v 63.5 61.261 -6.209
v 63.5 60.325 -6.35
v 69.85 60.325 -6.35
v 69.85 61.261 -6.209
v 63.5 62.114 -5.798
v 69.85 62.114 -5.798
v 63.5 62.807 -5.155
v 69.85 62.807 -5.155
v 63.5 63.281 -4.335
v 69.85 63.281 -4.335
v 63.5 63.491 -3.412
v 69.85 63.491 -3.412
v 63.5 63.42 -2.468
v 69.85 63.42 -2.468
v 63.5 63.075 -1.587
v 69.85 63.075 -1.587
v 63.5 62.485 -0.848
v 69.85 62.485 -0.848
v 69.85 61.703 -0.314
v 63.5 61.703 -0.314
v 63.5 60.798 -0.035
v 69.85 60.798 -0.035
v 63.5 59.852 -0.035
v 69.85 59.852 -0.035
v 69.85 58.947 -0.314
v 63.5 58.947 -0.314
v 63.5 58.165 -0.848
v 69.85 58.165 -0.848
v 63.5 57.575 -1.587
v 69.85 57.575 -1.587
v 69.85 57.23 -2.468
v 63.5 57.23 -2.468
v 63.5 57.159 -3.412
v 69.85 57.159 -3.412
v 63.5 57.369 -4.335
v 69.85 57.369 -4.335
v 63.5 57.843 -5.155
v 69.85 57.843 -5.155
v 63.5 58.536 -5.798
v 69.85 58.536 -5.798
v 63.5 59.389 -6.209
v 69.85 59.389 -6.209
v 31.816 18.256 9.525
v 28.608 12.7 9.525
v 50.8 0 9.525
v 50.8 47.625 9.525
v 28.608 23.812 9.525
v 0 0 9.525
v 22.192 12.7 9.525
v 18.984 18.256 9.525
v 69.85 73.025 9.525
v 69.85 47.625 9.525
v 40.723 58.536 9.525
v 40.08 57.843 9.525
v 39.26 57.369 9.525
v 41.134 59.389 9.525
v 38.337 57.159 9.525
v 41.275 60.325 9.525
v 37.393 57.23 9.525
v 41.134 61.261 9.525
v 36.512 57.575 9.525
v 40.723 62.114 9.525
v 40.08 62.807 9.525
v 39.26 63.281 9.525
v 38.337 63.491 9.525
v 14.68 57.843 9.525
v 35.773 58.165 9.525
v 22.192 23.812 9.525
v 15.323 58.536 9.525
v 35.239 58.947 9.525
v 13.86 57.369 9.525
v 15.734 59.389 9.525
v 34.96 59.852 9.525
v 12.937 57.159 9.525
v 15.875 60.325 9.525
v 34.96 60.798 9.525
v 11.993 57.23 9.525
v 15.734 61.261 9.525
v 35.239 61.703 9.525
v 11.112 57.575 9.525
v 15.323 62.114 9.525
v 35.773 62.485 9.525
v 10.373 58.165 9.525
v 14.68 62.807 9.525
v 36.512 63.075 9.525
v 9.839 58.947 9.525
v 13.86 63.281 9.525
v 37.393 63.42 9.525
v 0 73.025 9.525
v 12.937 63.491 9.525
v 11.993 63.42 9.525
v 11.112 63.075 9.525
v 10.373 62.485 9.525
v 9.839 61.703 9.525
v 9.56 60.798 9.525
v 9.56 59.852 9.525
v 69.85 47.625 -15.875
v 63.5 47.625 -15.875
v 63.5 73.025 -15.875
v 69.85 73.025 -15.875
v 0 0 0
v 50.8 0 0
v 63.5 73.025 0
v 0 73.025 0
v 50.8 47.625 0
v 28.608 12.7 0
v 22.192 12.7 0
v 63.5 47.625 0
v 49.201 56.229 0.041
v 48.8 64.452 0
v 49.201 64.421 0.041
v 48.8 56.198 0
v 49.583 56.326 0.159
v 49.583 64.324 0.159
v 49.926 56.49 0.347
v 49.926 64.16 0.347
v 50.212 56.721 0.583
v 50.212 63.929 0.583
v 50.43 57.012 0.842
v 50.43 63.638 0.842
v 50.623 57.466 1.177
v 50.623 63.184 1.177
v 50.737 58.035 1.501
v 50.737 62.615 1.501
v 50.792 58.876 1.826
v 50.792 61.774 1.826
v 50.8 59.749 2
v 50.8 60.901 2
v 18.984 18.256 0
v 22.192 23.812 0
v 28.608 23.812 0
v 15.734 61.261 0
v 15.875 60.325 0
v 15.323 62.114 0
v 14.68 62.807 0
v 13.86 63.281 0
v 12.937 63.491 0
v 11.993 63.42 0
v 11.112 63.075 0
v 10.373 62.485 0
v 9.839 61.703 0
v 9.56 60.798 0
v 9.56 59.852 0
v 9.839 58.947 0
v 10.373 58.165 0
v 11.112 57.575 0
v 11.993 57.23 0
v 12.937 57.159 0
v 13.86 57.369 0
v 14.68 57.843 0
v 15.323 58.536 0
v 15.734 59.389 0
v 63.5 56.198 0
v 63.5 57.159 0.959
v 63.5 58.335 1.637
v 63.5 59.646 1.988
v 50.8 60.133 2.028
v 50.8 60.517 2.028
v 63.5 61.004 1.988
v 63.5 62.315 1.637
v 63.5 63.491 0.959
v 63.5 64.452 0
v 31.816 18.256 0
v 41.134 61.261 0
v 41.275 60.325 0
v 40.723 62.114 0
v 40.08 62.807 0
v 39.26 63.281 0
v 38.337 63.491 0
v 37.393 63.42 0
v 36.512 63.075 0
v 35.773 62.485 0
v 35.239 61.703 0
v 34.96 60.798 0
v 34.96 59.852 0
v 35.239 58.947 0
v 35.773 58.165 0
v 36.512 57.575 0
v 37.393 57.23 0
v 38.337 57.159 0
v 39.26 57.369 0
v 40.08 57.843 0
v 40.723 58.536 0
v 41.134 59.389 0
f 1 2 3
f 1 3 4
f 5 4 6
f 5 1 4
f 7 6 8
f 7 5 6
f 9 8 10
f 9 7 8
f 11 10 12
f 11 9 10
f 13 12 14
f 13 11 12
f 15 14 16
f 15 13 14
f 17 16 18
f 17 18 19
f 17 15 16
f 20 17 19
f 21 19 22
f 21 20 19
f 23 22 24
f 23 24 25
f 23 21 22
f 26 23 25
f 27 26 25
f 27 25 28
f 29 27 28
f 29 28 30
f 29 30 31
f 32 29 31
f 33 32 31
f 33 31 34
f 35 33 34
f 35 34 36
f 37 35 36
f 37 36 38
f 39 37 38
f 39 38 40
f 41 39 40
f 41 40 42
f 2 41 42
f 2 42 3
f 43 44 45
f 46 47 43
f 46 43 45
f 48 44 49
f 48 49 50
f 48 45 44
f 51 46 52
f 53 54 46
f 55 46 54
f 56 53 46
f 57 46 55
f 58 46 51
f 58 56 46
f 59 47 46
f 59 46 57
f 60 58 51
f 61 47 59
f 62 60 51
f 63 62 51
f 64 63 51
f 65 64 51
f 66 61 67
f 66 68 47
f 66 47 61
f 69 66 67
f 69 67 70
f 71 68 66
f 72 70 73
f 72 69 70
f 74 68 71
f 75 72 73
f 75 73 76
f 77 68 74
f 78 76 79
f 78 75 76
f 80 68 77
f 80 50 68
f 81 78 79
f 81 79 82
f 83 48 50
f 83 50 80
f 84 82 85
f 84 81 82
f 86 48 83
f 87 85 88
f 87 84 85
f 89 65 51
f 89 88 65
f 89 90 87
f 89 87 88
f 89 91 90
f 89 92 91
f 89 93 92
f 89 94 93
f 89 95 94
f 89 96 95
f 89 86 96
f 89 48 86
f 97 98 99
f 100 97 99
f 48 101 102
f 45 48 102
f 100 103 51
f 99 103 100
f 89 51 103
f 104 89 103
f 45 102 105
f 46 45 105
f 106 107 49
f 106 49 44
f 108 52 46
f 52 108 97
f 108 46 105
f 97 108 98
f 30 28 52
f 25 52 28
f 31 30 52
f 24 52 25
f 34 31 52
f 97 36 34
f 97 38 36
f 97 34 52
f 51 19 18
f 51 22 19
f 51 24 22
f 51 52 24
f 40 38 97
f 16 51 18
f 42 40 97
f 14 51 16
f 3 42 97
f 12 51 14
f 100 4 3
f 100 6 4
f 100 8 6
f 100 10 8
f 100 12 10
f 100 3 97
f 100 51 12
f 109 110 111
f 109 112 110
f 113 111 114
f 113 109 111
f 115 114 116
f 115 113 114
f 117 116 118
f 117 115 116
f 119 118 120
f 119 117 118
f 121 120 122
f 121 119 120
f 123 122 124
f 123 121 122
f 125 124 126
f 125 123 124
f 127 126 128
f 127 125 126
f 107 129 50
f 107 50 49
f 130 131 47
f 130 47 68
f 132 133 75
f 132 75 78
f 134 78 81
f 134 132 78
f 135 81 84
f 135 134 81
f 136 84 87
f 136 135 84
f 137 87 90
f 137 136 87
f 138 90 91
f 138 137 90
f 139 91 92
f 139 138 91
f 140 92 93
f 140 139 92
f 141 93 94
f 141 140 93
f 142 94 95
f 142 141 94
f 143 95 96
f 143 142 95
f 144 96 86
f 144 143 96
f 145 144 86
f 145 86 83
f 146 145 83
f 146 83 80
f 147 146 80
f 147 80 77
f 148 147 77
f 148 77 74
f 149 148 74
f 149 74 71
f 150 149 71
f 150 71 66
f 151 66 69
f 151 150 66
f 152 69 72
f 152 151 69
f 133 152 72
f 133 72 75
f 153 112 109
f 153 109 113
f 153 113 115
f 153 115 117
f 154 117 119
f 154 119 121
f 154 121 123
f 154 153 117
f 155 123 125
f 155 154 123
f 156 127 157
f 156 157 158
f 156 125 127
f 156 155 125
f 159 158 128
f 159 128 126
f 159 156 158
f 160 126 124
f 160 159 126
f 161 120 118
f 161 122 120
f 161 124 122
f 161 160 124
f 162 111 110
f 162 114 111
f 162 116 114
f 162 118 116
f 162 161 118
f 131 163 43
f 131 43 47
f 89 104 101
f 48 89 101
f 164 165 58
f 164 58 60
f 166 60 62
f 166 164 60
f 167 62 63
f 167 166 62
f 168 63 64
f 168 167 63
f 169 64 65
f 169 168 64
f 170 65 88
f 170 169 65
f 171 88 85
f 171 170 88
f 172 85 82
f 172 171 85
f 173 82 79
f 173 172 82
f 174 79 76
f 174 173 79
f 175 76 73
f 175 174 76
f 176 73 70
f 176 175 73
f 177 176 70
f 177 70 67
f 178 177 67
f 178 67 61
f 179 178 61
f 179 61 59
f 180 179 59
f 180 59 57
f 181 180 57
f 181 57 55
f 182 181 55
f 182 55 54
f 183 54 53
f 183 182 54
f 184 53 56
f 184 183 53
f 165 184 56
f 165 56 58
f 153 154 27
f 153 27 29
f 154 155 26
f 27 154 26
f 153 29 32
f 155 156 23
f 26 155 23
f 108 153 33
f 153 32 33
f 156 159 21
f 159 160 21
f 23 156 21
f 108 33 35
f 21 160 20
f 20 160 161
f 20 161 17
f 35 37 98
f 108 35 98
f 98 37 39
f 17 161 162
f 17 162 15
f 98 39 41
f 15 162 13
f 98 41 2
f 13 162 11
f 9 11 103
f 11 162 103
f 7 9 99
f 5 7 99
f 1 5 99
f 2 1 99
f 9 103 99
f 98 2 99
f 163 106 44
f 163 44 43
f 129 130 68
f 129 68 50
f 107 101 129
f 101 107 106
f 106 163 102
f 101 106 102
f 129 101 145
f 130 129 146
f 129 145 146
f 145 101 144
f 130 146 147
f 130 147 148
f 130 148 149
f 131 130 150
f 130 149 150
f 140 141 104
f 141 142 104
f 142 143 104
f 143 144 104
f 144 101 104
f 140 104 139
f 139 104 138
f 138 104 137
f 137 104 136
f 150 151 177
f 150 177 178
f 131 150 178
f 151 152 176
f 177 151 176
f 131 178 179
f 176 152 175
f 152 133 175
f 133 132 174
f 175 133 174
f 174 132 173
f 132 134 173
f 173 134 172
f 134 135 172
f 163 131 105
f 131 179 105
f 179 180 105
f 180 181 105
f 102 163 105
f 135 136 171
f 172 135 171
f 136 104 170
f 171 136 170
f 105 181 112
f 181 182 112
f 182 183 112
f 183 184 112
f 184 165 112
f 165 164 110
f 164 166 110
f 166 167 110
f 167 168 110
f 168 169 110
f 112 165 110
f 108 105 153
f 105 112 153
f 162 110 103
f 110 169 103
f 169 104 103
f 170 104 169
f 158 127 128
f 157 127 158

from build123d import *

# Parameters (mm, degrees)
SKETCH2_R      = 3.175
EXTRUDE1_DEPTH = 9.525
SKETCH3_W      = 25.4
SKETCH3_H      = 25.4
SKETCH3_R      = 3.175
EXTRUDE2_DEPTH = 6.35
SKETCH4_R      = 5.207
EXTRUDE3_DEPTH = 12.7
FILLET1_R      = 2


with BuildPart() as part:
    # Sketch2 → Extrude1 (new body)
    with BuildSketch(Plane.XY):
        Polygon((0, 0), (50.8, 0), (50.8, 47.625), (63.5, 47.625), (63.5, 73.025), (50.8, 73.025), (0, 73.025), align=None)
        with Locations((12.7, 60.325)):
            Circle(SKETCH2_R, mode=Mode.SUBTRACT)
        with Locations((38.1, 60.325)):
            Circle(SKETCH2_R, mode=Mode.SUBTRACT)
        Polygon((31.815804866, 18.25625), (28.607902433, 23.8125), (22.192097567, 23.8125), (18.984195134, 18.25625), (22.192097567, 12.7), (28.607902433, 12.7), align=None, mode=Mode.SUBTRACT)
    extrude(amount=EXTRUDE1_DEPTH)

    # Sketch3 → Extrude2 (add)
    with BuildSketch(Plane(origin=(63.5, 0, 0), x_dir=(0, 0, -1), z_dir=(1, 0, 0))):
        with Locations((3.175, 60.325)):
            Rectangle(SKETCH3_W, SKETCH3_H)
        with Locations((3.175, 60.325)):
            Circle(SKETCH3_R, mode=Mode.SUBTRACT)
    extrude(amount=EXTRUDE2_DEPTH)

    # Sketch4 → Extrude3 (cut)
    with BuildSketch(Plane.ZY.offset(-63.5)):
        with Locations((-3.175, 60.325)):
            Circle(SKETCH4_R)
    extrude(amount=EXTRUDE3_DEPTH, mode=Mode.SUBTRACT)

    # Fillet1
    fillet1_edges = [part.edges().sort_by_distance(p)[0] for p in [
        (50.8, 60.325, 0),
    ]]
    fillet(fillet1_edges, radius=FILLET1_R)


solid = part.part
